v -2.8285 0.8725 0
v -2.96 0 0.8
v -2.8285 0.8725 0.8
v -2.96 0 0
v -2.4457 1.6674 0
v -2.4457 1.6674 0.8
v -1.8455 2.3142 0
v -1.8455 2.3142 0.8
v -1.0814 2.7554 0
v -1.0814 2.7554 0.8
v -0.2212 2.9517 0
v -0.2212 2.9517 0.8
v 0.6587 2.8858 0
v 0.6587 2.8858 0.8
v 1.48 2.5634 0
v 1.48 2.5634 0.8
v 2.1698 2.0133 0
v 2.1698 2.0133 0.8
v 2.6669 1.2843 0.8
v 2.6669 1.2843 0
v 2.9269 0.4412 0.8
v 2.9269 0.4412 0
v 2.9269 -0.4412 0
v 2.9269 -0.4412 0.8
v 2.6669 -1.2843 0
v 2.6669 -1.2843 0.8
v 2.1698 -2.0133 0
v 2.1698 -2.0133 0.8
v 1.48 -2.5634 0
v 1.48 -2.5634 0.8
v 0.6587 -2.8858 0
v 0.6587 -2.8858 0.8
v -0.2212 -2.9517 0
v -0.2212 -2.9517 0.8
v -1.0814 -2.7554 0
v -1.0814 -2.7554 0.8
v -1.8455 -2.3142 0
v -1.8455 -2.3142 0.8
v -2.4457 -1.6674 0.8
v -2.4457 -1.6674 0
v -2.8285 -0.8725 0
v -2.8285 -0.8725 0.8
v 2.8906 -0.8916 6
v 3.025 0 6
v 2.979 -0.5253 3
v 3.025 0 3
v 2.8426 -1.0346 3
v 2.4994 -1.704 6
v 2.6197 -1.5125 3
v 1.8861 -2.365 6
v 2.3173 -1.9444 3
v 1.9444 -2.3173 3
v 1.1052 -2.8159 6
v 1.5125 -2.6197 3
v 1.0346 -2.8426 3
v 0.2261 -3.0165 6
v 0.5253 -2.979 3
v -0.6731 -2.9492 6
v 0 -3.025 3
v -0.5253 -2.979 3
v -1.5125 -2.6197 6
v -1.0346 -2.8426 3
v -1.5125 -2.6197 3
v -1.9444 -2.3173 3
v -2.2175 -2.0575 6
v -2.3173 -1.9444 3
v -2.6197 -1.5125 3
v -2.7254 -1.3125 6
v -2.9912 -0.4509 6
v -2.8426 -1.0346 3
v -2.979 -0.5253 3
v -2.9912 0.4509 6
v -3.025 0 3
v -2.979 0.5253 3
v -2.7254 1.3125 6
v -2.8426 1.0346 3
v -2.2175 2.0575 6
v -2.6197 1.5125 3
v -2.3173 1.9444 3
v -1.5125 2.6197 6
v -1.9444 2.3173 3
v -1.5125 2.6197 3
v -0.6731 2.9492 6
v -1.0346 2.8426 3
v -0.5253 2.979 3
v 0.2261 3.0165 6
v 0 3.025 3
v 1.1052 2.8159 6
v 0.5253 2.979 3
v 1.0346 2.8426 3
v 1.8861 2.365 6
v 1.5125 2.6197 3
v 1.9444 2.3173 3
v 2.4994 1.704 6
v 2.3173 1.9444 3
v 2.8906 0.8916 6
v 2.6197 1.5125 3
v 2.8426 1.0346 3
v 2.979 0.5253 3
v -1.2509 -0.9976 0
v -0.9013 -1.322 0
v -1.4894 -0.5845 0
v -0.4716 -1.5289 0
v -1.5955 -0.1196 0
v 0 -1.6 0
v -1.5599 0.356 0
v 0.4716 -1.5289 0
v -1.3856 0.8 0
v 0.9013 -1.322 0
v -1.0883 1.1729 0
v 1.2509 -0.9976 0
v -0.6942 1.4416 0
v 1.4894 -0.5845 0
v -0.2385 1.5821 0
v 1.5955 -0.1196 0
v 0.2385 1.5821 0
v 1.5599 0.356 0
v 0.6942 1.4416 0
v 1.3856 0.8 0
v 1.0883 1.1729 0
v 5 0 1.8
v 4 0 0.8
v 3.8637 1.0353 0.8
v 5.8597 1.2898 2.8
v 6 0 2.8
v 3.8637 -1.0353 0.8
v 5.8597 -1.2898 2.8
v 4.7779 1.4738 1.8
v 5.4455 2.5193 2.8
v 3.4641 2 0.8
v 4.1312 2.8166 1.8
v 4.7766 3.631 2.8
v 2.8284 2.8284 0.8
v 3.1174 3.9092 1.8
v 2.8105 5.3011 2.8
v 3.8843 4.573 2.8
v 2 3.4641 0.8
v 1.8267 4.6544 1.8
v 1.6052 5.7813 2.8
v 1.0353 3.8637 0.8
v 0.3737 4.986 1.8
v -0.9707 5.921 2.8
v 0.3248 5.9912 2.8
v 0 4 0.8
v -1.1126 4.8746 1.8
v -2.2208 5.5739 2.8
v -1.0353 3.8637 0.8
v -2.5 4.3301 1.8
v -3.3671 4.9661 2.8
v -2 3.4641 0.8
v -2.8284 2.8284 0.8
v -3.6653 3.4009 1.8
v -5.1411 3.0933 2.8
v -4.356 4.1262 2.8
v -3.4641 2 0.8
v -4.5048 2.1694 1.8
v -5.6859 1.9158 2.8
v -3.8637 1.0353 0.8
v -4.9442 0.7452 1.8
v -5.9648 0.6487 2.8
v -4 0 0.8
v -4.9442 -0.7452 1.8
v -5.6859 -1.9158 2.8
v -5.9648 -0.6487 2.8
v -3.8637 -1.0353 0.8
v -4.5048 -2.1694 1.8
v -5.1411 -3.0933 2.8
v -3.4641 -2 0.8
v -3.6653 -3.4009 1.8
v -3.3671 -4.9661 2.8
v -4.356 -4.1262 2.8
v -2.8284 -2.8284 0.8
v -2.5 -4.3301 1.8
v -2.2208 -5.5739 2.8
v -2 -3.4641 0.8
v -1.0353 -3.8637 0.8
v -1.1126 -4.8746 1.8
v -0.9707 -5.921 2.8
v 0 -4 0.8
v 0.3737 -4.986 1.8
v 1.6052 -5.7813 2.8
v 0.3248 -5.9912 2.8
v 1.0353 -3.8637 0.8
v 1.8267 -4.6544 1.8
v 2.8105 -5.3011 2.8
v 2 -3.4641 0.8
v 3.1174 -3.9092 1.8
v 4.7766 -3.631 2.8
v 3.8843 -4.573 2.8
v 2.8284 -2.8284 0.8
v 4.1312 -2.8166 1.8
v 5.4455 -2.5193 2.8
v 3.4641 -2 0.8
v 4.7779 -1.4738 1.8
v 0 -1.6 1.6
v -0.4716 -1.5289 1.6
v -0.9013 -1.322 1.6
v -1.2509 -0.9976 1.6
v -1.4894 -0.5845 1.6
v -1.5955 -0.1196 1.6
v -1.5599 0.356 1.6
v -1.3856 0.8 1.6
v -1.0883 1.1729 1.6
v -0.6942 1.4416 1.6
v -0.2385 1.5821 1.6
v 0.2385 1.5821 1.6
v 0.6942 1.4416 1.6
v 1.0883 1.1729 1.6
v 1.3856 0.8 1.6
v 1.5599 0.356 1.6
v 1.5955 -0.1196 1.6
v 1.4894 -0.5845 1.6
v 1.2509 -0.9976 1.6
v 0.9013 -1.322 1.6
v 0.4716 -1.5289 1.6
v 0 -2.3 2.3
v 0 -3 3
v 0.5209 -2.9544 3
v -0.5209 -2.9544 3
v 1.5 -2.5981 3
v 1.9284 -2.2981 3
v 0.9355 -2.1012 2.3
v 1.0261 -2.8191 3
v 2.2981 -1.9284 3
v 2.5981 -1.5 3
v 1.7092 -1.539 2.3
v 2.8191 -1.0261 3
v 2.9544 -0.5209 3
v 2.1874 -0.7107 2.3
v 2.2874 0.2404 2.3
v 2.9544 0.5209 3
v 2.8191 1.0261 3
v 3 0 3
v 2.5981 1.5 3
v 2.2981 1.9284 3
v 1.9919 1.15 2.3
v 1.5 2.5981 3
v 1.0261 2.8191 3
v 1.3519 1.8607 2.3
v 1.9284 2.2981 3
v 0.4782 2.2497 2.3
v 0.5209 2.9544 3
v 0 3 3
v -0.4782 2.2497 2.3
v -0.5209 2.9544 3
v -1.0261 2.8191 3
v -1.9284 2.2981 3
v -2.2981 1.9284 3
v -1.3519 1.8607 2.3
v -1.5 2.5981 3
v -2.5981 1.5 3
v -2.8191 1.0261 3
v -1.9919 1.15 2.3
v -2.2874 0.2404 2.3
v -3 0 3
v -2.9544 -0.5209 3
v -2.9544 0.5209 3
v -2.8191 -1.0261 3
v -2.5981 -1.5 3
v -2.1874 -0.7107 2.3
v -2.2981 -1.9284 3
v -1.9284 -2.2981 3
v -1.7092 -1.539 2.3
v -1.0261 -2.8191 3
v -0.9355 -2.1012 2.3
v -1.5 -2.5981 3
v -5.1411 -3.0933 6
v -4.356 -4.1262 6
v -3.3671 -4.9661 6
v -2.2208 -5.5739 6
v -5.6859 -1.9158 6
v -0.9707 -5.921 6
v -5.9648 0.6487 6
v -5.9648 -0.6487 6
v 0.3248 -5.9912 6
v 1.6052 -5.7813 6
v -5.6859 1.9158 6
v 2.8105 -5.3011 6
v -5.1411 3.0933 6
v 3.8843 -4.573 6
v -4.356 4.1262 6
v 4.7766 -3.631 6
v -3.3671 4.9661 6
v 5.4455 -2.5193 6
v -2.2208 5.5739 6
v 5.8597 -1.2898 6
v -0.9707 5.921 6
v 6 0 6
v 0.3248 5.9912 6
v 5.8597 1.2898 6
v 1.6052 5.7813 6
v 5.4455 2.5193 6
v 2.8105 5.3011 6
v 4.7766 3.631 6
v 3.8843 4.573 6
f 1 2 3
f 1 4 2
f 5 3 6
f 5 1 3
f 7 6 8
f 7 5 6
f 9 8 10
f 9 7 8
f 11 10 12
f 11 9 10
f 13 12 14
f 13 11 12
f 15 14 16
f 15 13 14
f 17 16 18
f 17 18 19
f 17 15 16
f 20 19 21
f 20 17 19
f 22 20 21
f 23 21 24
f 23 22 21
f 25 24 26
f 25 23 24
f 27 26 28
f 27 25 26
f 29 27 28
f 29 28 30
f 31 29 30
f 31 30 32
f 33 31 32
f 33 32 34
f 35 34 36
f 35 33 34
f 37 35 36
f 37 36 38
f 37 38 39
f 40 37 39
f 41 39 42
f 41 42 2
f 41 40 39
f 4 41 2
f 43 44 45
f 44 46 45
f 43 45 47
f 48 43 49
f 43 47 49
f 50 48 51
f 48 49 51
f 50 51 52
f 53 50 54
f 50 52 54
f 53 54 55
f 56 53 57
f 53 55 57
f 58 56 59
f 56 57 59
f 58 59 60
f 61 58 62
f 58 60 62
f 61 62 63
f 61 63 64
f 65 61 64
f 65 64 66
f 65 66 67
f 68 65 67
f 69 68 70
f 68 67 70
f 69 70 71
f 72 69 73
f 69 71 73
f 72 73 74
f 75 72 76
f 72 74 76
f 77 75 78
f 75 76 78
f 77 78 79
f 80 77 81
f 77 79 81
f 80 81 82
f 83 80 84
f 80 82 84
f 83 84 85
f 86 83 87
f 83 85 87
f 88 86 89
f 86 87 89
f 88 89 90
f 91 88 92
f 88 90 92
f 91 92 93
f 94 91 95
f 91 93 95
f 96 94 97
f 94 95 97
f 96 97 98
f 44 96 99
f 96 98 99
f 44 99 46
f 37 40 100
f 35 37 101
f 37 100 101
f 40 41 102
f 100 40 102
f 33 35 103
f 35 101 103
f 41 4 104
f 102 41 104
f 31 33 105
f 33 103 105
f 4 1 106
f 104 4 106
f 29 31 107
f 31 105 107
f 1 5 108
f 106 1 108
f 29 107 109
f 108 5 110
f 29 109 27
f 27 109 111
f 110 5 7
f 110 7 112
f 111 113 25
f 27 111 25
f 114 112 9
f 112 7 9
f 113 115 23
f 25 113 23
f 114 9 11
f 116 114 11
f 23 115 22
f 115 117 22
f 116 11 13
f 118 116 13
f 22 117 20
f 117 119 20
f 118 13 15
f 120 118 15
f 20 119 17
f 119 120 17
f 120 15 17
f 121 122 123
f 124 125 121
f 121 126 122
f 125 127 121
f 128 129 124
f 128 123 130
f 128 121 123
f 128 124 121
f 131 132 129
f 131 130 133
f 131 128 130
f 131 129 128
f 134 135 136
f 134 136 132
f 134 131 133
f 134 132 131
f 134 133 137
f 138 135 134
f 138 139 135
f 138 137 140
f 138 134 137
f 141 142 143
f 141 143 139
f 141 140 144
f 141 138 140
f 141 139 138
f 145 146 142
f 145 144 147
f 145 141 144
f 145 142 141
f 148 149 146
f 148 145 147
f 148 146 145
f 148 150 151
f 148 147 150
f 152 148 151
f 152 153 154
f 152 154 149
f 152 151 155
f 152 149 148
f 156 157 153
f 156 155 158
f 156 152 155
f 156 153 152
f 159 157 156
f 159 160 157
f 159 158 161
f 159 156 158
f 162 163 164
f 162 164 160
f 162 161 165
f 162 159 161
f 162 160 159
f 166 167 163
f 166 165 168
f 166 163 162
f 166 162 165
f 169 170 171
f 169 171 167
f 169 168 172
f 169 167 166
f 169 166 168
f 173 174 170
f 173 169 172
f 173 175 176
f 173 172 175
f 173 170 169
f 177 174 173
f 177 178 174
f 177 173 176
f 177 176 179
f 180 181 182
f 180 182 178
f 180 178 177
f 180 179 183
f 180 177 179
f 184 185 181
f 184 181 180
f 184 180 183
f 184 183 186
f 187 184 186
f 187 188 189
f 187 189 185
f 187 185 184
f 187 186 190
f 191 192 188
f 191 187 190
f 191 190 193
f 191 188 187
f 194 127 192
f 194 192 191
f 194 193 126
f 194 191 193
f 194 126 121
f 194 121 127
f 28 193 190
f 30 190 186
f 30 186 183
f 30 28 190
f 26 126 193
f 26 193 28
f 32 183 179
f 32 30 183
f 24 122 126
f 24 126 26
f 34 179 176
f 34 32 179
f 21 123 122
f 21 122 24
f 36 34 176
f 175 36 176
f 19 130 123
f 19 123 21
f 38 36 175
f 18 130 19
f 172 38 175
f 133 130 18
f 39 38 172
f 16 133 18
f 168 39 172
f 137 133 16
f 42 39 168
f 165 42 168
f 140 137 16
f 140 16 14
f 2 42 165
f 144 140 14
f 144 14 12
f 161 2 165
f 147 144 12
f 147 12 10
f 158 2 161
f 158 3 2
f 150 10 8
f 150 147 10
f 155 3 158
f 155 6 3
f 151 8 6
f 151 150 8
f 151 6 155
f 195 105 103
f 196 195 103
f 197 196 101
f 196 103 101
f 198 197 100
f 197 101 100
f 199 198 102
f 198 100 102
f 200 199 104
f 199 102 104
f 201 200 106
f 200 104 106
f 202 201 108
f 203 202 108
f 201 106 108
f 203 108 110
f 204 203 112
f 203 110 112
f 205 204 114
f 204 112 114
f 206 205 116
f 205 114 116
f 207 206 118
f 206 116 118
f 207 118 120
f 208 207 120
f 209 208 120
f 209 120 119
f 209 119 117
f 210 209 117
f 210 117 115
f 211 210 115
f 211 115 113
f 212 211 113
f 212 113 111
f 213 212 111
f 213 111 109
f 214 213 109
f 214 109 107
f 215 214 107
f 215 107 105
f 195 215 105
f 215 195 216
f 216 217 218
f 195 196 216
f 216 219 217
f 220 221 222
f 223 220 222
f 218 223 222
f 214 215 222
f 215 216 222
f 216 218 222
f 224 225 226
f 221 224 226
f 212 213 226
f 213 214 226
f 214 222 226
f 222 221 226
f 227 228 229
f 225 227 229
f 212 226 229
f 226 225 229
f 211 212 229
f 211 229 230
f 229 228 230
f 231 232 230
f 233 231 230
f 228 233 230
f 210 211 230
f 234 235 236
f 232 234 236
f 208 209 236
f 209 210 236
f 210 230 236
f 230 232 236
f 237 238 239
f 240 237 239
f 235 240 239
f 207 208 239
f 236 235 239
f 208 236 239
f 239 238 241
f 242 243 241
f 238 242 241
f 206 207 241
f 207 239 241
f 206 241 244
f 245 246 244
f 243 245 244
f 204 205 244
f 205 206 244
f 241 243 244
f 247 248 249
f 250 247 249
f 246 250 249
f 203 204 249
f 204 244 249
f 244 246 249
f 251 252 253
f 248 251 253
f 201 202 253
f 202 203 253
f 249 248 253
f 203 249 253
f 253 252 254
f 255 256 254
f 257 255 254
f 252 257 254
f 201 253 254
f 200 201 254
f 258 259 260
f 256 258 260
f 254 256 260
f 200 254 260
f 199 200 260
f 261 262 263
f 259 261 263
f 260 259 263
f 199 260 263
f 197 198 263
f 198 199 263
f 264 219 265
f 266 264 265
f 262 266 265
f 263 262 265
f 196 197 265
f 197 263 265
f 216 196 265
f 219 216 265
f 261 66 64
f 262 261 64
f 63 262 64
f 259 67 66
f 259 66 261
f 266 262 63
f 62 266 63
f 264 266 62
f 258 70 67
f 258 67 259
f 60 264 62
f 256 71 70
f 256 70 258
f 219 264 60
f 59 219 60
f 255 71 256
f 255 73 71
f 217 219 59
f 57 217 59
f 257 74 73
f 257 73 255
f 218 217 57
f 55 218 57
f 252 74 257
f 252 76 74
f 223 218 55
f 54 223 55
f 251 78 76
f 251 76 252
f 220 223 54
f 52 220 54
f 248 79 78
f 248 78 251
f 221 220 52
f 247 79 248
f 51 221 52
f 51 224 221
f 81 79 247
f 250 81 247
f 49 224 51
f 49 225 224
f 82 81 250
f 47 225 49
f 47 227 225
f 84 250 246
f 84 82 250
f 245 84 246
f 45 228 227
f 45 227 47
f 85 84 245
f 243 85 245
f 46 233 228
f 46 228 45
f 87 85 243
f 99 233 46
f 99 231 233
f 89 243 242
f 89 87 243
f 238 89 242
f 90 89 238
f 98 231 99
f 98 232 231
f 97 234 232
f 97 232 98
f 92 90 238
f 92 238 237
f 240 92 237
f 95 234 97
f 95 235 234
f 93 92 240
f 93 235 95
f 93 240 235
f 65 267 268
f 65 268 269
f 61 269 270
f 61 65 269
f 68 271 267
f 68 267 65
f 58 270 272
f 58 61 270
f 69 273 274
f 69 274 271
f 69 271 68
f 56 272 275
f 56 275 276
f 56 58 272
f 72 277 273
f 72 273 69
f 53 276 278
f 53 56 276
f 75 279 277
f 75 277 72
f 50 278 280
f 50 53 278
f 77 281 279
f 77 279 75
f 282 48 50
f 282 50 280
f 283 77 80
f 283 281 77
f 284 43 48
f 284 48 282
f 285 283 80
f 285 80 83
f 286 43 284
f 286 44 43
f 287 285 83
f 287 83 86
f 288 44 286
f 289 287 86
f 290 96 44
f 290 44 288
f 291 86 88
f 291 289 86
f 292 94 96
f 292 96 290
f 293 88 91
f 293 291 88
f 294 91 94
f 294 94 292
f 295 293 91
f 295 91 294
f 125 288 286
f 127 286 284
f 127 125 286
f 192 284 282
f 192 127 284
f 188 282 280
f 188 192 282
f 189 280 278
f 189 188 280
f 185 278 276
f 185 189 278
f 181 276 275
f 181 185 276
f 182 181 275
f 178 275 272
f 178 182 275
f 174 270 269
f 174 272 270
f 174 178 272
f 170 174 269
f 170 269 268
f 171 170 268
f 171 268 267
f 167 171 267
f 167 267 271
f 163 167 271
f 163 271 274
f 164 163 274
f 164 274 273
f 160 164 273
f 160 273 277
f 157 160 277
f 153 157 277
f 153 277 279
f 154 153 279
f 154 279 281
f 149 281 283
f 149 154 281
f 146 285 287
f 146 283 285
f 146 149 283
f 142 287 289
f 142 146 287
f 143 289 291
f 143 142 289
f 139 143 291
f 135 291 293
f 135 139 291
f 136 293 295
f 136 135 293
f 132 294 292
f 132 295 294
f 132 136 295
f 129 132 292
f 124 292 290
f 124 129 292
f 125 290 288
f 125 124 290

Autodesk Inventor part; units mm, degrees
ref_plane "YZ Plane" through (0, 0, 0) normal (1, 0, 0) x (0, 1, 0)
ref_plane "XZ Plane" through (0, 0, 0) normal (0, 1, 0) x (-1, 0, 0)
ref_plane "XY Plane" through (0, 0, 0) normal (0, 0, 1) x (1, 0, 0)
sketch "Sketch1" plane through (0, 0, 0) normal (0, 0, 1) x (1, 0, 0)
  circle A0 centre (0, 0) radius 6
  dimension "d0" = 12
extrude "Extrusion1" add sketch "Sketch1" along normal blind 3.5
sketch "Sketch2" plane through (0, 0, 3.5) normal (0, 0, 1) x (1, 0, 0)
  circle A0 centre (0, 0) radius 1.55
  dimension "d3" = 3.1
extrude "Extrusion2" cut sketch "Sketch2" against normal through all
sketch "Sketch3" plane through (0, 0, 0) normal (0, 0, -1) x (-1, 0, 0)
  circle A0 centre (0, 0) radius 2.96
  circle A1 centre (0, 0) radius 7.5
  dimension "d6" = 5.92
  dimension "d16" = 15
extrude "Extrusion3" cut sketch "Sketch3" against normal blind 0.8
sketch "Sketch4" plane through (0, 0, 3.5) normal (0, 0, 1) x (1, 0, 0)
  circle A0 centre (0, 0) radius 2.5
  dimension "d9" = 5
extrude "Extrusion4" cut sketch "Sketch4" against normal blind 1.5
sketch "Sketch5" plane through (0, 0, 3.5) normal (0, 0, 1) x (1, 0, 0)
  circle A0 centre (0, 0) radius 6
  circle A1 centre (0, 0) radius 2.5 projected
  circle A2 centre (0, 0) radius 3.025
  circle A3 centre (0, 0) radius 6 projected
  dimension "d12" = 6.05
  dimension "d15" = 0
extrude "Extrusion5" add sketch "Sketch5" along normal blind 2.5 contours A0
chamfer "Chamfer1" distance 2 angle 45 1 edges at (-6, 0, 0.8)
sketch "Sketch6" plane through (0, 0, 3.5) normal (0, 0, 1) x (1, 0, 0)
  circle A0 centre (0, 0) radius 3.025 projected
  circle A1 centre (0, 0) radius 2.5 projected
extrude "Extrusion6" cut sketch "Sketch6" against normal up to surface (1.5 mm away)
sketch "Sketch7" plane through (0, 0, 2) normal (0, 0, 1) x (1, 0, 0)
  circle A0 centre (0, 0) radius 3.025 projected
  circle A1 centre (0, 0) radius 1.55 projected
extrude "Extrusion7" add sketch "Sketch7" along normal blind 1
sketch "Sketch8" plane through (0, 0, 3) normal (0, 0, 1) x (1, 0, 0)
  point P0 (0, 0)
hole "Hole1" at (0, 0, 3) direction (0, 0, -1) diameter 3.2 end through all countersink diameter 6 countersink angle 90
properties part number "motor_and_magnet_holder"
